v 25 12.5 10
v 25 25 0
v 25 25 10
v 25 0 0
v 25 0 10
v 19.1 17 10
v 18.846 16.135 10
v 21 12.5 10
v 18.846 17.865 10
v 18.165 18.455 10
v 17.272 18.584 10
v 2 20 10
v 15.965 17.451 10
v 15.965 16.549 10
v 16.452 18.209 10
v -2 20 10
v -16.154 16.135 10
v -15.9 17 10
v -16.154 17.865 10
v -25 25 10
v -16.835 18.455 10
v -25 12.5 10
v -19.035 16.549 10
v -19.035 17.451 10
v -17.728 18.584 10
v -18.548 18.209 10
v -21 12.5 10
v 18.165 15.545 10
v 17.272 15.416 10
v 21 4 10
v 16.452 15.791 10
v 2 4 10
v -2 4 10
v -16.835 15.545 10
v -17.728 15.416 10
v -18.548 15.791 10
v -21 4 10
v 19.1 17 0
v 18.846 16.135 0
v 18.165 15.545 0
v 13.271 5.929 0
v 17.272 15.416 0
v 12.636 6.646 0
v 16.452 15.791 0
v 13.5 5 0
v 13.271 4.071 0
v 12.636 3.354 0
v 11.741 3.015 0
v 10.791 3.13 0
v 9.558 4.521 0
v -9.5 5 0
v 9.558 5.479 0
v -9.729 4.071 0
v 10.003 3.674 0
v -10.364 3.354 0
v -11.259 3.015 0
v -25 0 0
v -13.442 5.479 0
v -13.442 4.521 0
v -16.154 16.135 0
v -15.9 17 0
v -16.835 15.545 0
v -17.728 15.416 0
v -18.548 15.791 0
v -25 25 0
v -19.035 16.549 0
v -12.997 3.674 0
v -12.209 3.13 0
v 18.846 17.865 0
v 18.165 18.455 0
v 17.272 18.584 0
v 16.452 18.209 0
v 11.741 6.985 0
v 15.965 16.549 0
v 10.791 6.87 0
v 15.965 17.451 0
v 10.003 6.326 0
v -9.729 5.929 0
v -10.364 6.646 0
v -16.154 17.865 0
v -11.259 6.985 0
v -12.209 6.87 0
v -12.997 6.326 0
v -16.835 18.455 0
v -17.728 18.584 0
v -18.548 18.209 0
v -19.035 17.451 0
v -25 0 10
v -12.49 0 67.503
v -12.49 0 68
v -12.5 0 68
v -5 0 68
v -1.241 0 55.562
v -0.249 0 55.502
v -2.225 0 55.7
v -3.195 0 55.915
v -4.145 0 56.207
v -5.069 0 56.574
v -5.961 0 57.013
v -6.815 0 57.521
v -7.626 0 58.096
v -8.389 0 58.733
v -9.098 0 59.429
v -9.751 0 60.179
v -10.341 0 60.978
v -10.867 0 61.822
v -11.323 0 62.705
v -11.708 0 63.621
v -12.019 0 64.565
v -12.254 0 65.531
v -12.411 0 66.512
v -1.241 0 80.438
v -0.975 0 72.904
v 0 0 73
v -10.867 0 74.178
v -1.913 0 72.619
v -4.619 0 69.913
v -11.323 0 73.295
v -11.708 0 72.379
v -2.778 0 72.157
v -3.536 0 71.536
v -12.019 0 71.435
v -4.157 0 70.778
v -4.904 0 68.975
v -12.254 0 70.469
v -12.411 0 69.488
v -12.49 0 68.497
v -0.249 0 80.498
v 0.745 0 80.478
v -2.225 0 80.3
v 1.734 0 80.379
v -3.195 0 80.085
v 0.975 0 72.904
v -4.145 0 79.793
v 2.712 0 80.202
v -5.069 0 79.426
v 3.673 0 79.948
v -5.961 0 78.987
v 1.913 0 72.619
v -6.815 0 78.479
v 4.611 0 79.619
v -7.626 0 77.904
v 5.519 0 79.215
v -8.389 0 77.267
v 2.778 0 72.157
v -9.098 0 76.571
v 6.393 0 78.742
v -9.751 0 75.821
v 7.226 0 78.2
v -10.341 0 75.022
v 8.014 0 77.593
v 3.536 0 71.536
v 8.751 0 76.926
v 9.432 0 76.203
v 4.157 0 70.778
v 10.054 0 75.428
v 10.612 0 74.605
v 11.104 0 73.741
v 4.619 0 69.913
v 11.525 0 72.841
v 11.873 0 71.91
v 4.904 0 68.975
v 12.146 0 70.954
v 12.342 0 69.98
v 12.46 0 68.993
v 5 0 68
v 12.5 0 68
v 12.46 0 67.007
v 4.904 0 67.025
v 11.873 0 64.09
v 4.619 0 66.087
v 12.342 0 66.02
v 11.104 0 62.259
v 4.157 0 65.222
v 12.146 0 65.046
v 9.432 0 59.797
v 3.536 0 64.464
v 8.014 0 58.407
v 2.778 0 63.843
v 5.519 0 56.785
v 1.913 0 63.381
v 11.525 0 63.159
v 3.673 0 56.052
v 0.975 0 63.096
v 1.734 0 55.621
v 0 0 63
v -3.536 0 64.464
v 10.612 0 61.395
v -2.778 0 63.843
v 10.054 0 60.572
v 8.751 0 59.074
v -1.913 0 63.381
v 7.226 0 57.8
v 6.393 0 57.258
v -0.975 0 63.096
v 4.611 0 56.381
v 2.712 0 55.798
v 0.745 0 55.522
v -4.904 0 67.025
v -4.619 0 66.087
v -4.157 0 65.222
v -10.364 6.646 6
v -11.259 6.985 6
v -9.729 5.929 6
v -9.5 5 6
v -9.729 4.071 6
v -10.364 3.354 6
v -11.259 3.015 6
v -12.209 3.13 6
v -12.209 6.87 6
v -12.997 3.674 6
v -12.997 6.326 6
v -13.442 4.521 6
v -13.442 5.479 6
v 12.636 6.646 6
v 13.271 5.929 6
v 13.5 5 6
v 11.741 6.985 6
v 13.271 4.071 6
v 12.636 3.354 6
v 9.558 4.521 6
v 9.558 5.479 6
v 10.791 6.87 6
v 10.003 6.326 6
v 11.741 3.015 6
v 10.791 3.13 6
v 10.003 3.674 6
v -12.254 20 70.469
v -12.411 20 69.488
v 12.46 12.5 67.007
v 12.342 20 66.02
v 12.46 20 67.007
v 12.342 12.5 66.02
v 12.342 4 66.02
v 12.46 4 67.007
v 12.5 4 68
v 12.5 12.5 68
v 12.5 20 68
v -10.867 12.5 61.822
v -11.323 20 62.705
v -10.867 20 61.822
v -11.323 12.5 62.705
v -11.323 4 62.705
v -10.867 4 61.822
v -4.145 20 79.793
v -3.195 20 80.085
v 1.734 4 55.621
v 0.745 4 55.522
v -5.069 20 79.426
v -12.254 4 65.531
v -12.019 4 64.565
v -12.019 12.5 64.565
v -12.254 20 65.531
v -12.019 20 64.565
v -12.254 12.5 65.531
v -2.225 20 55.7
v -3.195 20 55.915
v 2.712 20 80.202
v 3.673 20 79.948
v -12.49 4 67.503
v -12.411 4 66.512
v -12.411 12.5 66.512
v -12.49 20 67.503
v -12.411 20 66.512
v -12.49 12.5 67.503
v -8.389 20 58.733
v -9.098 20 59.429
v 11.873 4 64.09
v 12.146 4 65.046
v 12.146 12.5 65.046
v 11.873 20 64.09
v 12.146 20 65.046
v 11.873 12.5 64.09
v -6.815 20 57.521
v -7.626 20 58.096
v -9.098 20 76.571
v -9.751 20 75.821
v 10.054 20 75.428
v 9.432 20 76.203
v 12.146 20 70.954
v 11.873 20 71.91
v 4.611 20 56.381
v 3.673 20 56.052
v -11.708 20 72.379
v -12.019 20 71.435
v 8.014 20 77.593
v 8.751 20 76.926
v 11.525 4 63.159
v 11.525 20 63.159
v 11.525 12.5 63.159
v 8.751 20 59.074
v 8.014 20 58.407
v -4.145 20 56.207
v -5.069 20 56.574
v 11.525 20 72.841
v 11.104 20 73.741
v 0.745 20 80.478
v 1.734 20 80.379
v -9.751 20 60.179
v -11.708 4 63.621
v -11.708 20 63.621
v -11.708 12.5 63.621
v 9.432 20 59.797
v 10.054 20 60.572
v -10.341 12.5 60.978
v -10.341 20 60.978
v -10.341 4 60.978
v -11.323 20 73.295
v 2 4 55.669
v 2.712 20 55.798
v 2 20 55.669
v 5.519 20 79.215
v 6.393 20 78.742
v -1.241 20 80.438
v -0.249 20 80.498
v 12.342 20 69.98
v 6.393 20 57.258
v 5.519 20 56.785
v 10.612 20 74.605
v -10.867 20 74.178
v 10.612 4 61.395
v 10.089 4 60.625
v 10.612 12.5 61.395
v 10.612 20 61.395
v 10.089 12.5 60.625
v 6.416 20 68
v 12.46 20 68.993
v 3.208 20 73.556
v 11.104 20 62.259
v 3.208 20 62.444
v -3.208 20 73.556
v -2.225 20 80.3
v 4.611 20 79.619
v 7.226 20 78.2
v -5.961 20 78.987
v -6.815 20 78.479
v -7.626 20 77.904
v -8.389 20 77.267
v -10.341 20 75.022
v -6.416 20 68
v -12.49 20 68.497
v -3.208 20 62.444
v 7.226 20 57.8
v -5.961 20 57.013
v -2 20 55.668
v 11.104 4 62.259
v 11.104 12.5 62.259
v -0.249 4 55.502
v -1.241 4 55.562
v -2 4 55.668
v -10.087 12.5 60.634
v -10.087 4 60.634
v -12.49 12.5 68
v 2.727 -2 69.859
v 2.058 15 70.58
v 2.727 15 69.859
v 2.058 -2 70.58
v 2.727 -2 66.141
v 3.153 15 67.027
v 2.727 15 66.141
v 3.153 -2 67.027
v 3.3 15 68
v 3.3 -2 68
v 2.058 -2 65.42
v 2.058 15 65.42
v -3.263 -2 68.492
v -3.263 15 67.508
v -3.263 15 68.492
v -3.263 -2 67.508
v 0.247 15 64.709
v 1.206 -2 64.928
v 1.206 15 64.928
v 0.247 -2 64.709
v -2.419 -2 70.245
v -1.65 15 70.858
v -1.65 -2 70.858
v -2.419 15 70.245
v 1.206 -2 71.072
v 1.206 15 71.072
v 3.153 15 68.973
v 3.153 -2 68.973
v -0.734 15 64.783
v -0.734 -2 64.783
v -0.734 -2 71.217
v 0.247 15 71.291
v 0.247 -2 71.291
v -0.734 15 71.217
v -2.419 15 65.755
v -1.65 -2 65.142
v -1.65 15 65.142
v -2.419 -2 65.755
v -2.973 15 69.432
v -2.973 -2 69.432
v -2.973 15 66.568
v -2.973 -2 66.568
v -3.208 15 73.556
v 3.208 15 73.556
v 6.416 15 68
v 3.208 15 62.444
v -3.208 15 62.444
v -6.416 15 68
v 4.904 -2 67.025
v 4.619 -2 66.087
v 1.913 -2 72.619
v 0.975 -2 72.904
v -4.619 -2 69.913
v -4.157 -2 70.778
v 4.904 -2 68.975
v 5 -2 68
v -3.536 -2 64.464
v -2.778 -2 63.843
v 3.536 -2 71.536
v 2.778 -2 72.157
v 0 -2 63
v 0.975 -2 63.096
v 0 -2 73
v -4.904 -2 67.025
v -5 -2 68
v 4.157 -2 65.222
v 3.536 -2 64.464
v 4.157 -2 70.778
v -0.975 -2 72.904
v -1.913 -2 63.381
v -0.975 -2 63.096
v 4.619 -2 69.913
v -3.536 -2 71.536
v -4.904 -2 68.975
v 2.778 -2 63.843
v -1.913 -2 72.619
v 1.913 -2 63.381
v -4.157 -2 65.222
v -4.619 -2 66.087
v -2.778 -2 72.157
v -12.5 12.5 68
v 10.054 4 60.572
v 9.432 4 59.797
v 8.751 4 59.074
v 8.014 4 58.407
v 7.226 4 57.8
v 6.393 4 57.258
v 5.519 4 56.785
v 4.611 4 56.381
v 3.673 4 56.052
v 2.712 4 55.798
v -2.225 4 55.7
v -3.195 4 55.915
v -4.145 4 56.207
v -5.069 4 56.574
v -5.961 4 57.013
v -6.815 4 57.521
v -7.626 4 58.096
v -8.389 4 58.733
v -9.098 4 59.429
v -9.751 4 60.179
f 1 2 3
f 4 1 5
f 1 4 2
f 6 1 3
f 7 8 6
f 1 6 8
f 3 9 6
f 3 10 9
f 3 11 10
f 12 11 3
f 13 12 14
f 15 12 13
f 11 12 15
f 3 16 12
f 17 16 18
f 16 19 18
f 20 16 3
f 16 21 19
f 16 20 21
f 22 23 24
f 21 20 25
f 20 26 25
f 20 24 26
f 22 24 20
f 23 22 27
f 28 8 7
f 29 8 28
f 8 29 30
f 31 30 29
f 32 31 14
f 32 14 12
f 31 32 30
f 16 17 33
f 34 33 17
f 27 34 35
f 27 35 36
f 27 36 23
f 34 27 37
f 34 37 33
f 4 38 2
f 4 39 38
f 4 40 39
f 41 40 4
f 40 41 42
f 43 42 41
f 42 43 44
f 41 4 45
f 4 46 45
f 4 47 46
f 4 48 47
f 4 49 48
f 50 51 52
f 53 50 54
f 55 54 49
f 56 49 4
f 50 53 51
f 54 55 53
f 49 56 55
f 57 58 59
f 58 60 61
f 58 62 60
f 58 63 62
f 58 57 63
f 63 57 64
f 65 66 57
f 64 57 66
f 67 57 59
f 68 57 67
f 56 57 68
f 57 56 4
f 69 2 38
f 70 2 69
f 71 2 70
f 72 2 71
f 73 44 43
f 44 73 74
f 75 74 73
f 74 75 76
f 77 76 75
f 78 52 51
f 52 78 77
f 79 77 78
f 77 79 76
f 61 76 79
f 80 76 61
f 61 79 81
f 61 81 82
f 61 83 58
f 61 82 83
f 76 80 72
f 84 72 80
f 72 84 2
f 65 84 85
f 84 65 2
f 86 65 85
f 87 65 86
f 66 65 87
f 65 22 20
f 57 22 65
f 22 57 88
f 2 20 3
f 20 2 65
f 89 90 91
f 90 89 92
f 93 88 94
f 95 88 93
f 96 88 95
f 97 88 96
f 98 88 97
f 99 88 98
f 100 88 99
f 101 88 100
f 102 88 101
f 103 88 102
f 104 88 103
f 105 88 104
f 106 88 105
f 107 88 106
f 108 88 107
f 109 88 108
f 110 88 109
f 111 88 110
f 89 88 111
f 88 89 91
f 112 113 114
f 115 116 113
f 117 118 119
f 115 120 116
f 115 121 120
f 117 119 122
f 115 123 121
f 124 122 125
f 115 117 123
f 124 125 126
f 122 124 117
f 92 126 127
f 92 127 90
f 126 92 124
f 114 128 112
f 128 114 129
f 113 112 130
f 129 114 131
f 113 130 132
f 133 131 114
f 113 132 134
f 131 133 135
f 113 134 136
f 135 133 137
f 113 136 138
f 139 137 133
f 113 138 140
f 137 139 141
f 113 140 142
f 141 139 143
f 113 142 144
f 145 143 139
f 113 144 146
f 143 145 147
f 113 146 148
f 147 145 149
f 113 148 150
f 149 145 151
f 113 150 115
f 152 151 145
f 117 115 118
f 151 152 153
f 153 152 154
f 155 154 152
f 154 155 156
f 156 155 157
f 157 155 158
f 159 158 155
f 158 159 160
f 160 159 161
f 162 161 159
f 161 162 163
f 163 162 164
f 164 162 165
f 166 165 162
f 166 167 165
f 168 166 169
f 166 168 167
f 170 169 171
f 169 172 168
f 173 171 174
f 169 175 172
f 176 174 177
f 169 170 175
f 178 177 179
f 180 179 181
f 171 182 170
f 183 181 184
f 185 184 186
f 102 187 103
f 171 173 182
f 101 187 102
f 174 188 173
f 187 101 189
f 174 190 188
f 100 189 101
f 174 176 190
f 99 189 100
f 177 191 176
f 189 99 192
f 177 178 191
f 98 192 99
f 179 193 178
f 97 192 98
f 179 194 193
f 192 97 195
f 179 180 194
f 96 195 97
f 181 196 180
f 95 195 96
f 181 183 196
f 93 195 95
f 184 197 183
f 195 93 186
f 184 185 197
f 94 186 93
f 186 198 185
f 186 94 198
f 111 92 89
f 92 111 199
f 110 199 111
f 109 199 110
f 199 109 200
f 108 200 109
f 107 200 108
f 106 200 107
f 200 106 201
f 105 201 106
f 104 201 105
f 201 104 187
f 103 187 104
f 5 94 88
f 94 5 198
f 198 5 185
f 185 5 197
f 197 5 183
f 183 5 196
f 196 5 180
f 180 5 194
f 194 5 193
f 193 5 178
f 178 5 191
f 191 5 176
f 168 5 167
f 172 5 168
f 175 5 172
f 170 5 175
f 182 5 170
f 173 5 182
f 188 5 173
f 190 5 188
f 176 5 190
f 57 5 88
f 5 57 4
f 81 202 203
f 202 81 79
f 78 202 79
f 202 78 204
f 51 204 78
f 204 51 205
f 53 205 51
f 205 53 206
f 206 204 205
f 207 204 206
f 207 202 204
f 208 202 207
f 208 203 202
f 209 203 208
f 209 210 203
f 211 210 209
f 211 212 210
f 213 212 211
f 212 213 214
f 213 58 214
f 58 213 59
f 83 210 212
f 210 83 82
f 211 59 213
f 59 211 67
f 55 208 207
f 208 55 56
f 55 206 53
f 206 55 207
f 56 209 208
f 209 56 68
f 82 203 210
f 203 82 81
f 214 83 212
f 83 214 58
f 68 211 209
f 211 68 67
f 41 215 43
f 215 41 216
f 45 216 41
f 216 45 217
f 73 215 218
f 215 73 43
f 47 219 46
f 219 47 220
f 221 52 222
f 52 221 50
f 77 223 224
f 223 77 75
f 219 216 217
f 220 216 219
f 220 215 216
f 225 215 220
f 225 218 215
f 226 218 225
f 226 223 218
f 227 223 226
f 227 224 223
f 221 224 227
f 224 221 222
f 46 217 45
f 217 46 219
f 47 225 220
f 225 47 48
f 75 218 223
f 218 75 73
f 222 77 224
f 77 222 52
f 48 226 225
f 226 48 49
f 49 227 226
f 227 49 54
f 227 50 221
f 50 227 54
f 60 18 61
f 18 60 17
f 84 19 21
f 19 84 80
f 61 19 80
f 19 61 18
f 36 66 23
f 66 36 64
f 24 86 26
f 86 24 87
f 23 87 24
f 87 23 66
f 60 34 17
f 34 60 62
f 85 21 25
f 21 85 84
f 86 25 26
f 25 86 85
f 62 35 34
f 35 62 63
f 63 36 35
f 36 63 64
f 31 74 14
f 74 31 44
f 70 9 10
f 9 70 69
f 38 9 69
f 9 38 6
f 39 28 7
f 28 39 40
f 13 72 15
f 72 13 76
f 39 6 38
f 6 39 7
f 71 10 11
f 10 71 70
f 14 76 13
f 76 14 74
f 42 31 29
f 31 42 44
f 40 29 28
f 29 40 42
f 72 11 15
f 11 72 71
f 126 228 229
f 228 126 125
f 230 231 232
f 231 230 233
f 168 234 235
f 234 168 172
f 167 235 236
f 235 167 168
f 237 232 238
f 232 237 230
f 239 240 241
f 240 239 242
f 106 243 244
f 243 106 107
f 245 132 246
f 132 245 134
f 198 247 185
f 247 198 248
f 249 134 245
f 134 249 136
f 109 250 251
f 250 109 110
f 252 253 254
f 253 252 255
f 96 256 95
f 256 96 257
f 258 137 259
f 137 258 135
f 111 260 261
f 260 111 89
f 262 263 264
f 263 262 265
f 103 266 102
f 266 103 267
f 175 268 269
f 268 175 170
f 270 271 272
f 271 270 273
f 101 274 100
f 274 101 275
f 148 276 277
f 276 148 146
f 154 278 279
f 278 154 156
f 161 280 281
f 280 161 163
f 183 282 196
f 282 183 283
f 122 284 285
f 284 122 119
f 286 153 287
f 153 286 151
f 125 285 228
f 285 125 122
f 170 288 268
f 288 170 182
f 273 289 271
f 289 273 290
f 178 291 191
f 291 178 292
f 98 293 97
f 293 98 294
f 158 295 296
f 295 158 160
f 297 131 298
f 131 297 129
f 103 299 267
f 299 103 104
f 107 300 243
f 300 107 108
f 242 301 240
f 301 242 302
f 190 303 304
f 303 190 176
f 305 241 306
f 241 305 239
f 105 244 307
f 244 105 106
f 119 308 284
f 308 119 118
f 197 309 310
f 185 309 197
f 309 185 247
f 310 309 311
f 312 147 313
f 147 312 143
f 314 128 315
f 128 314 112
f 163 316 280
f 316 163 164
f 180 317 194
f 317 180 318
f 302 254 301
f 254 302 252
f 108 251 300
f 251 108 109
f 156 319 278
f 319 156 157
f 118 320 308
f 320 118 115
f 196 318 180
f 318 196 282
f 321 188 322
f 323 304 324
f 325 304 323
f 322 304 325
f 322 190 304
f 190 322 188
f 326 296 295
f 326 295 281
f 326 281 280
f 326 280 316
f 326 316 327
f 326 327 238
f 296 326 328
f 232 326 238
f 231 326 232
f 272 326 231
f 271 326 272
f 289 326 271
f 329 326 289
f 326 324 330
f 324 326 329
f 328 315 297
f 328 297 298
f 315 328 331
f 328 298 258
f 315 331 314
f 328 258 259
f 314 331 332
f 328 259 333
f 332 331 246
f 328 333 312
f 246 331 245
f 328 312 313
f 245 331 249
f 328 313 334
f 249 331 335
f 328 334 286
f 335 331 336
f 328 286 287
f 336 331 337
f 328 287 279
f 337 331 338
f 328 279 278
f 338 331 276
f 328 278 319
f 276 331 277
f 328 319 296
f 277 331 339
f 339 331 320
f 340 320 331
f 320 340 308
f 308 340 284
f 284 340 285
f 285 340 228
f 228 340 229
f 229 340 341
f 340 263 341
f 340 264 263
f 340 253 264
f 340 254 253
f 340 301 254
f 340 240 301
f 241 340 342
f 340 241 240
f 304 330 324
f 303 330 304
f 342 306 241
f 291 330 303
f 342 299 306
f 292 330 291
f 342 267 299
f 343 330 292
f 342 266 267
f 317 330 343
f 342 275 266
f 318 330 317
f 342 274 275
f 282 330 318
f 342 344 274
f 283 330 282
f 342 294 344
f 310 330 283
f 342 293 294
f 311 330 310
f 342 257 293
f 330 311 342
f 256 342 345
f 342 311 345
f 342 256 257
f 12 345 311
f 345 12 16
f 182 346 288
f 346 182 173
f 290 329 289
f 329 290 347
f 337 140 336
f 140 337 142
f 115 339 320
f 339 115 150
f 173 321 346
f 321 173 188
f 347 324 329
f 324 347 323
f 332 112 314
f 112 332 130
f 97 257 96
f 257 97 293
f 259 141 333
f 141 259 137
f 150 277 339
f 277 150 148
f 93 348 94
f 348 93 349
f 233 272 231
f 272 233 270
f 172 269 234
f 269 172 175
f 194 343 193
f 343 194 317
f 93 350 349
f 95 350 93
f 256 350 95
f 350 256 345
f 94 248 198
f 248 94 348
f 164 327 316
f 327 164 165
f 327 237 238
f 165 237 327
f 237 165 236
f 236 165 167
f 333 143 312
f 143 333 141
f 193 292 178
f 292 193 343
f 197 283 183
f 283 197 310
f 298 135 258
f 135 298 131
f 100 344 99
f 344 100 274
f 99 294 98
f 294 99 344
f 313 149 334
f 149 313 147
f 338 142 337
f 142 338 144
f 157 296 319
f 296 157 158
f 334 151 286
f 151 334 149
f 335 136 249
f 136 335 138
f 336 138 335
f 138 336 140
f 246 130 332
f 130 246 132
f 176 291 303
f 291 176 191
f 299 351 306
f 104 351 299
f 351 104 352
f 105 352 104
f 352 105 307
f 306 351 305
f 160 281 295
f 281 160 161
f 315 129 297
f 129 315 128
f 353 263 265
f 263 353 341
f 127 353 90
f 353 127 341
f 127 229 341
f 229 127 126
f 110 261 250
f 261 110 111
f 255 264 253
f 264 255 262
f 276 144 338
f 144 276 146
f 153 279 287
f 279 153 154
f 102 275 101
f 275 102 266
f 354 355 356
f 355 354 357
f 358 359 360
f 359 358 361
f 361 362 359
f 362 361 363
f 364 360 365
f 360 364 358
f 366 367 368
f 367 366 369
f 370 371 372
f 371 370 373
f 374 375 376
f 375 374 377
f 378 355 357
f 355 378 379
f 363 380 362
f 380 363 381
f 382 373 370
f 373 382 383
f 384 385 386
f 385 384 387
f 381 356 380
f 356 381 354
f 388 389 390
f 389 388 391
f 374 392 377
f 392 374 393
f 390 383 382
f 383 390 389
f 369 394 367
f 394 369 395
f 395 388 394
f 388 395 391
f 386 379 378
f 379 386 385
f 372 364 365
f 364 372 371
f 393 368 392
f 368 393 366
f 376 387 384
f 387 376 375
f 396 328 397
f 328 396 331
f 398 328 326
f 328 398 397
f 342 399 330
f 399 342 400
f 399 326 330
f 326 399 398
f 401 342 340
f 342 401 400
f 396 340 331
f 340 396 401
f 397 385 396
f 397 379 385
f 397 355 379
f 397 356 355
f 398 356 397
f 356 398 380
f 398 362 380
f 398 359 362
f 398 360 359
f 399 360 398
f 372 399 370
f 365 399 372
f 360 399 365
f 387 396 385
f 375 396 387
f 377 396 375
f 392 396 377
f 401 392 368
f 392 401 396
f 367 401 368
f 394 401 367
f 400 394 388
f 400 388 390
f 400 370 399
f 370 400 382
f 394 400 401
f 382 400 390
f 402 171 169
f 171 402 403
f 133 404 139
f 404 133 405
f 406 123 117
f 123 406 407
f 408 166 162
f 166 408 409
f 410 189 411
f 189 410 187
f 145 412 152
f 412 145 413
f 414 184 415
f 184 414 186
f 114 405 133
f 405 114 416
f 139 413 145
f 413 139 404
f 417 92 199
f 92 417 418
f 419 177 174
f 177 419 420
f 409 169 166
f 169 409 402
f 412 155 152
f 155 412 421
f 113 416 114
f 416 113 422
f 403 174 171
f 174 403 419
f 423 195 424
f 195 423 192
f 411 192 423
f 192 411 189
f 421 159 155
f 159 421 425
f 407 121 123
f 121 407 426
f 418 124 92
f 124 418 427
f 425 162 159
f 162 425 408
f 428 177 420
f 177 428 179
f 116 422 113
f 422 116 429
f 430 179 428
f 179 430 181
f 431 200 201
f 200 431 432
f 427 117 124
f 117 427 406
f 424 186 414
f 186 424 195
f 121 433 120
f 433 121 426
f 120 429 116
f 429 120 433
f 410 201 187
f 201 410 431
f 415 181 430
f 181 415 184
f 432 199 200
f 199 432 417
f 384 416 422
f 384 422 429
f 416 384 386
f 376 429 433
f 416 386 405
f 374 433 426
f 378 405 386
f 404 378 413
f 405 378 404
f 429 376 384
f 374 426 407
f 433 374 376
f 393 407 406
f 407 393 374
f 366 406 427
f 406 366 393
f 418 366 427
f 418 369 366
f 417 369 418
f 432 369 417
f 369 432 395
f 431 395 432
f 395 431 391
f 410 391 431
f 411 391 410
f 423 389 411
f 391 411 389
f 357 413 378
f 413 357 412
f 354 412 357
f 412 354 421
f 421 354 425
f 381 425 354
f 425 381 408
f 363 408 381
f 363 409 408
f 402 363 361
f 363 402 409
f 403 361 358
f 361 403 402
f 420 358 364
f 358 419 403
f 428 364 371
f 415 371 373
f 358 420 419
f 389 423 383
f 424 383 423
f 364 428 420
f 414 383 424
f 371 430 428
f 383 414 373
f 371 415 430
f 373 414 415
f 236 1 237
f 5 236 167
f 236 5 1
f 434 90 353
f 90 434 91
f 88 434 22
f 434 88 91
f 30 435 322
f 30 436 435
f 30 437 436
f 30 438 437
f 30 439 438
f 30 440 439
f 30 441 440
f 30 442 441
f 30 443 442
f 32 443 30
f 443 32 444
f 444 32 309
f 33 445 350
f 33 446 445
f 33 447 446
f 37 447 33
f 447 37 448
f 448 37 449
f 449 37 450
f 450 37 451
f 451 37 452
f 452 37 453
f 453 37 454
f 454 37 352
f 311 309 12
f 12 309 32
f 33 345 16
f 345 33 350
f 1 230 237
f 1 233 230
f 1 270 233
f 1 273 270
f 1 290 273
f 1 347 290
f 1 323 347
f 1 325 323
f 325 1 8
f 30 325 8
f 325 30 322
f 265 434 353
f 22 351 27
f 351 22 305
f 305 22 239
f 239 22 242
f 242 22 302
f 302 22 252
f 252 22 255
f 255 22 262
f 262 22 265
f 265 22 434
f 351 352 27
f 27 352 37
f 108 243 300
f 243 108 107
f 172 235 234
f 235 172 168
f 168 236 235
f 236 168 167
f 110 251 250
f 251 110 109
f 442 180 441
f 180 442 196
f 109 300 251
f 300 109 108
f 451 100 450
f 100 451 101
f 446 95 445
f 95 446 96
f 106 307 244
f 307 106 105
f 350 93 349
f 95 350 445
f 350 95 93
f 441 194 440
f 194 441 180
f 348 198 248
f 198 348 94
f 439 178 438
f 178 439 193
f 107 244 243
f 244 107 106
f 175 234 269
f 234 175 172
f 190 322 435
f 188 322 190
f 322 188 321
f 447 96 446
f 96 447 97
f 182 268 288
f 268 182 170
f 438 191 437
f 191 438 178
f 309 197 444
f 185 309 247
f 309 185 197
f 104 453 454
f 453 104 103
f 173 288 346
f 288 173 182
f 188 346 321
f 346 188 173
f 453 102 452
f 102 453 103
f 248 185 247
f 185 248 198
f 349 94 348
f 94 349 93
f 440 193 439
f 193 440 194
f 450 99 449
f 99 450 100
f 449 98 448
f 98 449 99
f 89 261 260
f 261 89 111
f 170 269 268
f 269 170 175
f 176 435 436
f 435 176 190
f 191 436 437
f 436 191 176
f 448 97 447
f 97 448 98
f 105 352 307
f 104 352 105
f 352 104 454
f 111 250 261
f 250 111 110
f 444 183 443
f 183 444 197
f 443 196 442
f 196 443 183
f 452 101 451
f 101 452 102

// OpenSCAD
/*
 * Reel holder - replacement for standard FlashForge Inventor
 * to work with reel hubs and hub adapters to accommodate a
 * wide range of standard reels.  Handles up to 200mm diameter
 * reels of up to 1kg mass.
 */

$fa = 1;
$fs = 1;

// Base Plate dimensions.
BPWidth = 50;
BPDepth = 25;
BPHeight = 10;
PinR = 2;
HoleR = 1.6;
PinSep = 23;
HoleSep = 35;
PinOff = 5;
HoleOff = 17;
PinH = 6;
Wall = 4;

in = 25.4;

// Standoff dimensions
SOHeight = 58;
SOWidth = 25;
SODepth = 20;
SOHoleR = 3.3;
SOOffset = 2;
SOCollarR = 5;

// Nut head
NHDepth = 5;
NHWidth = 7/16*in;
NHDiameter = NHWidth / cos(30);
NHR = NHDiameter/2;

// Base Plate
difference(){
  translate([-1*BPWidth/2,0,0]){
    cube([BPWidth,BPDepth,BPHeight]);
  }
  translate([-1*PinSep/2,PinOff,0]){
    cylinder(r=PinR,h=PinH);
  }
  translate([PinSep/2,PinOff,0]){
    cylinder(r=PinR,h=PinH);
  }
  translate([-1*HoleSep/2,HoleOff,0]) {
    cylinder(r=HoleR, h=BPHeight);
  }
  translate([HoleSep/2,HoleOff,0]) {
    cylinder(r=HoleR, h=BPHeight);
  }
}

// Nut Holder
translate([0,0,SOHeight+BPHeight]){
    difference() {
            rotate(a=-90, v=[1,0,0]) {
        cylinder(r=SOWidth/2,h=SODepth);
            }
            rotate(a=-90, v=[1,0,0]){
        cylinder(r=SOHoleR,h=SODepth);
            }
       translate([0,SODepth-NHDepth,0]){
            rotate(a=-90, v=[1,0,0]){
            cylinder(r=NHR, h=NHDepth, $fn=6);
        }
    }
    }
    translate([0,-1*SOOffset,0]){
        rotate(a=-90,v=[1,0,0]) {
        difference(){
          cylinder(r=SOCollarR, h=SOOffset);
          cylinder(r=SOHoleR, h=SOOffset);
        }
    }
}
}

// Standoff
// Front plate
difference(){
    union(){
    polyhedron(points=[
     [-1*BPWidth/2,0,BPHeight], // 0
     [BPWidth/2,0,BPHeight], // 1
     [BPWidth/2,Wall, BPHeight], // 2
     [-1*BPWidth/2,Wall,BPHeight], // 3
     [-1*SOWidth/2,0,BPHeight+SOHeight], // 4
     [SOWidth/2, 0, BPHeight+SOHeight], // 5
     [SOWidth/2, Wall, BPHeight+SOHeight], // 6
     [-1*SOWidth/2, Wall, BPHeight+SOHeight] // 7
    ],
    faces=[
    [0,1,2,3],  // bottom
  [4,5,1,0],  // front
  [7,6,5,4],  // top
  [5,6,2,1],  // right
  [6,7,3,2],  // back
  [7,4,0,3] // left
    ]);
    translate([-1*Wall/2, 0, BPHeight]){
        cube([Wall, SODepth, SOHeight + Wall/2 - SOWidth/2]);
    }
    polyhedron(points=[
    [BPWidth/2,Wall, BPHeight],
    [BPWidth/2,BPDepth/2, BPHeight],
    [BPWidth/2-Wall,BPDepth/2,BPHeight],
    [BPWidth/2-Wall, Wall, BPHeight],
    [SOWidth/2,Wall, BPHeight+SOHeight],
    [SOWidth/2,BPDepth/2, BPHeight+SOHeight],
    [SOWidth/2-Wall,BPDepth/2,BPHeight+SOHeight],
    [SOWidth/2-Wall, Wall, BPHeight+SOHeight]
    ],
    faces=[
        [0,1,2,3],  // bottom
  [4,5,1,0],  // front
  [7,6,5,4],  // top
  [5,6,2,1],  // right
  [6,7,3,2],  // back
  [7,4,0,3] // left
    ]);
       polyhedron(points=[
    [-1*BPWidth/2,Wall, BPHeight],
    [-1*BPWidth/2,BPDepth/2, BPHeight],
    [-1*(BPWidth/2-Wall),BPDepth/2,BPHeight],
    [-1*(BPWidth/2-Wall), Wall, BPHeight],
    [-1*SOWidth/2,Wall, BPHeight+SOHeight],
    [-1*SOWidth/2,BPDepth/2, BPHeight+SOHeight],
    [-1*(SOWidth/2-Wall),BPDepth/2,BPHeight+SOHeight],
    [-1*(SOWidth/2-Wall), Wall, BPHeight+SOHeight]
    ],
    faces=[
        [0,1,2,3],  // bottom
  [4,5,1,0],  // front
  [7,6,5,4],  // top
  [5,6,2,1],  // right
  [6,7,3,2],  // back
  [7,4,0,3] // left
    ]);
}
    translate([0,0,BPHeight+SOHeight]){
      rotate(a=-90,v=[1,0,0]){
        cylinder(r=SOWidth/2,h=Wall);
      }
    }
}
